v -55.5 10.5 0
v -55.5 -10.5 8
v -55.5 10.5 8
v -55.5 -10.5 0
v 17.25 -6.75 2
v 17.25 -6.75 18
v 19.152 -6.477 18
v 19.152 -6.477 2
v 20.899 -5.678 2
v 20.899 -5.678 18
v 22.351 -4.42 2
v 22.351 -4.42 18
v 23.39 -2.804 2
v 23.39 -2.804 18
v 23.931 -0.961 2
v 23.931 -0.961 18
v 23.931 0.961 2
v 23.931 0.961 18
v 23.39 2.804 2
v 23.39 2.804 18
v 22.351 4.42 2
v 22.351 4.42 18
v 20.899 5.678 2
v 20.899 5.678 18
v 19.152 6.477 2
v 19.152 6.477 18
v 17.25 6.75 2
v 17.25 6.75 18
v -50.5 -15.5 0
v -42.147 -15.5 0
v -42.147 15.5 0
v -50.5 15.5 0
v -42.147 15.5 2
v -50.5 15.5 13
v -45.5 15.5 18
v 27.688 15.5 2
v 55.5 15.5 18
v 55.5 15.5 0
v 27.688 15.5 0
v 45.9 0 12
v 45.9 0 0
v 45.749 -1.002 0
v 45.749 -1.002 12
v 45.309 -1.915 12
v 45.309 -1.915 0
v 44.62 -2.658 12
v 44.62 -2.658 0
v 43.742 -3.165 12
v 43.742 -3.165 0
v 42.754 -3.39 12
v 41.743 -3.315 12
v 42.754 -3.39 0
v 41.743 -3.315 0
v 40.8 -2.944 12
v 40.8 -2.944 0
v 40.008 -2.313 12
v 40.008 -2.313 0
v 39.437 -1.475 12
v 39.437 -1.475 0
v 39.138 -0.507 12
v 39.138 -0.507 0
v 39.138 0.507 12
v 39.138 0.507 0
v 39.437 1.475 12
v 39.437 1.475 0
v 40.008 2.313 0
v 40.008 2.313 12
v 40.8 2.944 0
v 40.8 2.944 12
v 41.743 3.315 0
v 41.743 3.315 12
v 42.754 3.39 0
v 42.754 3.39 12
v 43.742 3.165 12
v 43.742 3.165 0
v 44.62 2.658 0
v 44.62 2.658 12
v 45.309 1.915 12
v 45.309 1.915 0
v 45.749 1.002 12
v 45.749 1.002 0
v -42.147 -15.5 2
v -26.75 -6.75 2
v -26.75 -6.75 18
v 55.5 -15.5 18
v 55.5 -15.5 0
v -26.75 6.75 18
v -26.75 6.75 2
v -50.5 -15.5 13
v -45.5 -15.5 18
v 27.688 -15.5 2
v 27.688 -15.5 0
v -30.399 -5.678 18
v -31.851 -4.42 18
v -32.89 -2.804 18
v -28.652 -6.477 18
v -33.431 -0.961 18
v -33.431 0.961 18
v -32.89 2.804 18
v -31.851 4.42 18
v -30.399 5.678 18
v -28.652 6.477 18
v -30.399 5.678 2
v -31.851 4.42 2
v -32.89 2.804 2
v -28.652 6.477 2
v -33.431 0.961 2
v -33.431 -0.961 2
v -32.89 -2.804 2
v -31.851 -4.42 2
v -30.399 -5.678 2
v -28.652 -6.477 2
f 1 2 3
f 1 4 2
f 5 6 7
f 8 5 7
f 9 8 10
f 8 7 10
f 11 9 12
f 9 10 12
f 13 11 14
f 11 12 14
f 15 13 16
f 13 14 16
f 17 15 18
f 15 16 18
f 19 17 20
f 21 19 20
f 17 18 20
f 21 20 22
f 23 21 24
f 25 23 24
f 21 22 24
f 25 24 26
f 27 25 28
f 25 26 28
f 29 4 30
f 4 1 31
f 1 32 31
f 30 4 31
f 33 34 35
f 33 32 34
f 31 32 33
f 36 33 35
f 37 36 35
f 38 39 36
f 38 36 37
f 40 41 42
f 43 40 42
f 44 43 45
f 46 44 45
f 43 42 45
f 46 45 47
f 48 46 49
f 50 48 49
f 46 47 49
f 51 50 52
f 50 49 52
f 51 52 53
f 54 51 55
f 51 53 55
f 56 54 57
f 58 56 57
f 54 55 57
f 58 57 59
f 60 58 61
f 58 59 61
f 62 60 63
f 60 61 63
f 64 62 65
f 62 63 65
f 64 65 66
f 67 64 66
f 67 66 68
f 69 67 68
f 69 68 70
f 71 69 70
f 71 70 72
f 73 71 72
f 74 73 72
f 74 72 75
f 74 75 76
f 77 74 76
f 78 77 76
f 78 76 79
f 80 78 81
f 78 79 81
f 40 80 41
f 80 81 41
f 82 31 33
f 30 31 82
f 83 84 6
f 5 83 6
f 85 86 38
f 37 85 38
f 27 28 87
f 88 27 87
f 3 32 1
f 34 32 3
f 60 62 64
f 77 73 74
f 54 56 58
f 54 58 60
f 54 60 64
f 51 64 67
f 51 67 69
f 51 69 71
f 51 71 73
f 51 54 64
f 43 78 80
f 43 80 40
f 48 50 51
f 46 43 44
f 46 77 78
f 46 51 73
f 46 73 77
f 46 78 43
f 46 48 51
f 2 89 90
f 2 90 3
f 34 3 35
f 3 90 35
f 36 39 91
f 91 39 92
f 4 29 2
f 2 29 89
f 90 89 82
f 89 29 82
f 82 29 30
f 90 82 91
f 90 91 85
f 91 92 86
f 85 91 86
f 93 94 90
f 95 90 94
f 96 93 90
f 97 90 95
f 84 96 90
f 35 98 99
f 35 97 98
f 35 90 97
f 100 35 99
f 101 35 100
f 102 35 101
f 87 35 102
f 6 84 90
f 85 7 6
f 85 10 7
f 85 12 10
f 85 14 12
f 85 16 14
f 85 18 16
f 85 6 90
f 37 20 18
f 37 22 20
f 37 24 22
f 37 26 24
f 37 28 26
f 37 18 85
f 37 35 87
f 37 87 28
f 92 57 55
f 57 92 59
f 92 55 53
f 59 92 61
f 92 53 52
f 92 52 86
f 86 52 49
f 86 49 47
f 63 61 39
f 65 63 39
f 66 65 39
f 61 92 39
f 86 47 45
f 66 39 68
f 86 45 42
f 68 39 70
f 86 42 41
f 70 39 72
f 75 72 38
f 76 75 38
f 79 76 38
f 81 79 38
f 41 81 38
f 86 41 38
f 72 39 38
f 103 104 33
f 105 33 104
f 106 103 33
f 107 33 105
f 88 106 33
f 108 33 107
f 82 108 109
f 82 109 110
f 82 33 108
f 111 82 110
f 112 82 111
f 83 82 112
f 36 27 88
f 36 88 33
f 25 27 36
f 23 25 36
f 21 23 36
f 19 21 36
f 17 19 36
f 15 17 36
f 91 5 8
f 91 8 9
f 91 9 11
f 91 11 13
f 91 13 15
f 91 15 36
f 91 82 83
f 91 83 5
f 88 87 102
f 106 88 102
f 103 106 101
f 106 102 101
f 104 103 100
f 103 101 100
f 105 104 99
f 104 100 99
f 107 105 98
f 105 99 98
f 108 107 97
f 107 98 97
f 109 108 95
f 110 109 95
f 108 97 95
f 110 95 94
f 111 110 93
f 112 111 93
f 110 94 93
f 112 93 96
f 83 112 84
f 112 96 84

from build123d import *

# Parameters (mm, degrees)
F0_W     = 111
F0_H     = 31
F1_DEPTH = 18
F3_DEPTH = 20
F4_R     = 3.4
F5_DEPTH = 12
F6_W     = 69.834876
F6_H     = 31
F7_DEPTH = 2
F8_SIZE  = 10
F9_SIZE  = 5


with BuildPart() as f1:
    # F0 (on Top) → F1 (new body)
    with BuildSketch(Plane.XY):
        Rectangle(F0_W, F0_H)
    extrude(amount=F1_DEPTH)

    # F2 (on face) → F3 (cut)
    with BuildSketch(Plane.XY.offset(18)):
        with BuildLine():
            Line((17.25, 6.75), (-26.75, 6.75))
            ThreePointArc((-26.75, 6.75), (-33.5, 0), (-26.75, -6.75))
            Line((-26.75, -6.75), (17.25, -6.75))
            ThreePointArc((17.25, -6.75), (24, 0), (17.25, 6.75))
        make_face()
    extrude(amount=-F3_DEPTH, mode=Mode.SUBTRACT)

    # F4 (on face) → F5 (cut)
    with BuildSketch(Plane(origin=(0, 0, 0), x_dir=(1, 0, 0), z_dir=(0, 0, -1))):
        with Locations((42.5, 0)):
            Circle(F4_R)
    extrude(amount=-F5_DEPTH, mode=Mode.SUBTRACT)

    # F6 (on face) → F7 (cut)
    with BuildSketch(Plane(origin=(0, 0, 0), x_dir=(1, 0, 0), z_dir=(0, 0, -1))):
        with Locations((-7.229885, 0)):
            Rectangle(F6_W, F6_H)
    extrude(amount=-F7_DEPTH, mode=Mode.SUBTRACT)

    # F8
    f8_edges = [f1.edges().sort_by_distance(p)[0] for p in [
        (-55.5, 0, 18),
    ]]
    chamfer(f8_edges, length=F8_SIZE)

    # F9
    f9_edges = [f1.edges().sort_by_distance(p)[0] for p in [
        (-55.5, -15.5, 4),
        (-55.5, 15.5, 4),
    ]]
    chamfer(f9_edges, length=F9_SIZE)


solid = f1.part
